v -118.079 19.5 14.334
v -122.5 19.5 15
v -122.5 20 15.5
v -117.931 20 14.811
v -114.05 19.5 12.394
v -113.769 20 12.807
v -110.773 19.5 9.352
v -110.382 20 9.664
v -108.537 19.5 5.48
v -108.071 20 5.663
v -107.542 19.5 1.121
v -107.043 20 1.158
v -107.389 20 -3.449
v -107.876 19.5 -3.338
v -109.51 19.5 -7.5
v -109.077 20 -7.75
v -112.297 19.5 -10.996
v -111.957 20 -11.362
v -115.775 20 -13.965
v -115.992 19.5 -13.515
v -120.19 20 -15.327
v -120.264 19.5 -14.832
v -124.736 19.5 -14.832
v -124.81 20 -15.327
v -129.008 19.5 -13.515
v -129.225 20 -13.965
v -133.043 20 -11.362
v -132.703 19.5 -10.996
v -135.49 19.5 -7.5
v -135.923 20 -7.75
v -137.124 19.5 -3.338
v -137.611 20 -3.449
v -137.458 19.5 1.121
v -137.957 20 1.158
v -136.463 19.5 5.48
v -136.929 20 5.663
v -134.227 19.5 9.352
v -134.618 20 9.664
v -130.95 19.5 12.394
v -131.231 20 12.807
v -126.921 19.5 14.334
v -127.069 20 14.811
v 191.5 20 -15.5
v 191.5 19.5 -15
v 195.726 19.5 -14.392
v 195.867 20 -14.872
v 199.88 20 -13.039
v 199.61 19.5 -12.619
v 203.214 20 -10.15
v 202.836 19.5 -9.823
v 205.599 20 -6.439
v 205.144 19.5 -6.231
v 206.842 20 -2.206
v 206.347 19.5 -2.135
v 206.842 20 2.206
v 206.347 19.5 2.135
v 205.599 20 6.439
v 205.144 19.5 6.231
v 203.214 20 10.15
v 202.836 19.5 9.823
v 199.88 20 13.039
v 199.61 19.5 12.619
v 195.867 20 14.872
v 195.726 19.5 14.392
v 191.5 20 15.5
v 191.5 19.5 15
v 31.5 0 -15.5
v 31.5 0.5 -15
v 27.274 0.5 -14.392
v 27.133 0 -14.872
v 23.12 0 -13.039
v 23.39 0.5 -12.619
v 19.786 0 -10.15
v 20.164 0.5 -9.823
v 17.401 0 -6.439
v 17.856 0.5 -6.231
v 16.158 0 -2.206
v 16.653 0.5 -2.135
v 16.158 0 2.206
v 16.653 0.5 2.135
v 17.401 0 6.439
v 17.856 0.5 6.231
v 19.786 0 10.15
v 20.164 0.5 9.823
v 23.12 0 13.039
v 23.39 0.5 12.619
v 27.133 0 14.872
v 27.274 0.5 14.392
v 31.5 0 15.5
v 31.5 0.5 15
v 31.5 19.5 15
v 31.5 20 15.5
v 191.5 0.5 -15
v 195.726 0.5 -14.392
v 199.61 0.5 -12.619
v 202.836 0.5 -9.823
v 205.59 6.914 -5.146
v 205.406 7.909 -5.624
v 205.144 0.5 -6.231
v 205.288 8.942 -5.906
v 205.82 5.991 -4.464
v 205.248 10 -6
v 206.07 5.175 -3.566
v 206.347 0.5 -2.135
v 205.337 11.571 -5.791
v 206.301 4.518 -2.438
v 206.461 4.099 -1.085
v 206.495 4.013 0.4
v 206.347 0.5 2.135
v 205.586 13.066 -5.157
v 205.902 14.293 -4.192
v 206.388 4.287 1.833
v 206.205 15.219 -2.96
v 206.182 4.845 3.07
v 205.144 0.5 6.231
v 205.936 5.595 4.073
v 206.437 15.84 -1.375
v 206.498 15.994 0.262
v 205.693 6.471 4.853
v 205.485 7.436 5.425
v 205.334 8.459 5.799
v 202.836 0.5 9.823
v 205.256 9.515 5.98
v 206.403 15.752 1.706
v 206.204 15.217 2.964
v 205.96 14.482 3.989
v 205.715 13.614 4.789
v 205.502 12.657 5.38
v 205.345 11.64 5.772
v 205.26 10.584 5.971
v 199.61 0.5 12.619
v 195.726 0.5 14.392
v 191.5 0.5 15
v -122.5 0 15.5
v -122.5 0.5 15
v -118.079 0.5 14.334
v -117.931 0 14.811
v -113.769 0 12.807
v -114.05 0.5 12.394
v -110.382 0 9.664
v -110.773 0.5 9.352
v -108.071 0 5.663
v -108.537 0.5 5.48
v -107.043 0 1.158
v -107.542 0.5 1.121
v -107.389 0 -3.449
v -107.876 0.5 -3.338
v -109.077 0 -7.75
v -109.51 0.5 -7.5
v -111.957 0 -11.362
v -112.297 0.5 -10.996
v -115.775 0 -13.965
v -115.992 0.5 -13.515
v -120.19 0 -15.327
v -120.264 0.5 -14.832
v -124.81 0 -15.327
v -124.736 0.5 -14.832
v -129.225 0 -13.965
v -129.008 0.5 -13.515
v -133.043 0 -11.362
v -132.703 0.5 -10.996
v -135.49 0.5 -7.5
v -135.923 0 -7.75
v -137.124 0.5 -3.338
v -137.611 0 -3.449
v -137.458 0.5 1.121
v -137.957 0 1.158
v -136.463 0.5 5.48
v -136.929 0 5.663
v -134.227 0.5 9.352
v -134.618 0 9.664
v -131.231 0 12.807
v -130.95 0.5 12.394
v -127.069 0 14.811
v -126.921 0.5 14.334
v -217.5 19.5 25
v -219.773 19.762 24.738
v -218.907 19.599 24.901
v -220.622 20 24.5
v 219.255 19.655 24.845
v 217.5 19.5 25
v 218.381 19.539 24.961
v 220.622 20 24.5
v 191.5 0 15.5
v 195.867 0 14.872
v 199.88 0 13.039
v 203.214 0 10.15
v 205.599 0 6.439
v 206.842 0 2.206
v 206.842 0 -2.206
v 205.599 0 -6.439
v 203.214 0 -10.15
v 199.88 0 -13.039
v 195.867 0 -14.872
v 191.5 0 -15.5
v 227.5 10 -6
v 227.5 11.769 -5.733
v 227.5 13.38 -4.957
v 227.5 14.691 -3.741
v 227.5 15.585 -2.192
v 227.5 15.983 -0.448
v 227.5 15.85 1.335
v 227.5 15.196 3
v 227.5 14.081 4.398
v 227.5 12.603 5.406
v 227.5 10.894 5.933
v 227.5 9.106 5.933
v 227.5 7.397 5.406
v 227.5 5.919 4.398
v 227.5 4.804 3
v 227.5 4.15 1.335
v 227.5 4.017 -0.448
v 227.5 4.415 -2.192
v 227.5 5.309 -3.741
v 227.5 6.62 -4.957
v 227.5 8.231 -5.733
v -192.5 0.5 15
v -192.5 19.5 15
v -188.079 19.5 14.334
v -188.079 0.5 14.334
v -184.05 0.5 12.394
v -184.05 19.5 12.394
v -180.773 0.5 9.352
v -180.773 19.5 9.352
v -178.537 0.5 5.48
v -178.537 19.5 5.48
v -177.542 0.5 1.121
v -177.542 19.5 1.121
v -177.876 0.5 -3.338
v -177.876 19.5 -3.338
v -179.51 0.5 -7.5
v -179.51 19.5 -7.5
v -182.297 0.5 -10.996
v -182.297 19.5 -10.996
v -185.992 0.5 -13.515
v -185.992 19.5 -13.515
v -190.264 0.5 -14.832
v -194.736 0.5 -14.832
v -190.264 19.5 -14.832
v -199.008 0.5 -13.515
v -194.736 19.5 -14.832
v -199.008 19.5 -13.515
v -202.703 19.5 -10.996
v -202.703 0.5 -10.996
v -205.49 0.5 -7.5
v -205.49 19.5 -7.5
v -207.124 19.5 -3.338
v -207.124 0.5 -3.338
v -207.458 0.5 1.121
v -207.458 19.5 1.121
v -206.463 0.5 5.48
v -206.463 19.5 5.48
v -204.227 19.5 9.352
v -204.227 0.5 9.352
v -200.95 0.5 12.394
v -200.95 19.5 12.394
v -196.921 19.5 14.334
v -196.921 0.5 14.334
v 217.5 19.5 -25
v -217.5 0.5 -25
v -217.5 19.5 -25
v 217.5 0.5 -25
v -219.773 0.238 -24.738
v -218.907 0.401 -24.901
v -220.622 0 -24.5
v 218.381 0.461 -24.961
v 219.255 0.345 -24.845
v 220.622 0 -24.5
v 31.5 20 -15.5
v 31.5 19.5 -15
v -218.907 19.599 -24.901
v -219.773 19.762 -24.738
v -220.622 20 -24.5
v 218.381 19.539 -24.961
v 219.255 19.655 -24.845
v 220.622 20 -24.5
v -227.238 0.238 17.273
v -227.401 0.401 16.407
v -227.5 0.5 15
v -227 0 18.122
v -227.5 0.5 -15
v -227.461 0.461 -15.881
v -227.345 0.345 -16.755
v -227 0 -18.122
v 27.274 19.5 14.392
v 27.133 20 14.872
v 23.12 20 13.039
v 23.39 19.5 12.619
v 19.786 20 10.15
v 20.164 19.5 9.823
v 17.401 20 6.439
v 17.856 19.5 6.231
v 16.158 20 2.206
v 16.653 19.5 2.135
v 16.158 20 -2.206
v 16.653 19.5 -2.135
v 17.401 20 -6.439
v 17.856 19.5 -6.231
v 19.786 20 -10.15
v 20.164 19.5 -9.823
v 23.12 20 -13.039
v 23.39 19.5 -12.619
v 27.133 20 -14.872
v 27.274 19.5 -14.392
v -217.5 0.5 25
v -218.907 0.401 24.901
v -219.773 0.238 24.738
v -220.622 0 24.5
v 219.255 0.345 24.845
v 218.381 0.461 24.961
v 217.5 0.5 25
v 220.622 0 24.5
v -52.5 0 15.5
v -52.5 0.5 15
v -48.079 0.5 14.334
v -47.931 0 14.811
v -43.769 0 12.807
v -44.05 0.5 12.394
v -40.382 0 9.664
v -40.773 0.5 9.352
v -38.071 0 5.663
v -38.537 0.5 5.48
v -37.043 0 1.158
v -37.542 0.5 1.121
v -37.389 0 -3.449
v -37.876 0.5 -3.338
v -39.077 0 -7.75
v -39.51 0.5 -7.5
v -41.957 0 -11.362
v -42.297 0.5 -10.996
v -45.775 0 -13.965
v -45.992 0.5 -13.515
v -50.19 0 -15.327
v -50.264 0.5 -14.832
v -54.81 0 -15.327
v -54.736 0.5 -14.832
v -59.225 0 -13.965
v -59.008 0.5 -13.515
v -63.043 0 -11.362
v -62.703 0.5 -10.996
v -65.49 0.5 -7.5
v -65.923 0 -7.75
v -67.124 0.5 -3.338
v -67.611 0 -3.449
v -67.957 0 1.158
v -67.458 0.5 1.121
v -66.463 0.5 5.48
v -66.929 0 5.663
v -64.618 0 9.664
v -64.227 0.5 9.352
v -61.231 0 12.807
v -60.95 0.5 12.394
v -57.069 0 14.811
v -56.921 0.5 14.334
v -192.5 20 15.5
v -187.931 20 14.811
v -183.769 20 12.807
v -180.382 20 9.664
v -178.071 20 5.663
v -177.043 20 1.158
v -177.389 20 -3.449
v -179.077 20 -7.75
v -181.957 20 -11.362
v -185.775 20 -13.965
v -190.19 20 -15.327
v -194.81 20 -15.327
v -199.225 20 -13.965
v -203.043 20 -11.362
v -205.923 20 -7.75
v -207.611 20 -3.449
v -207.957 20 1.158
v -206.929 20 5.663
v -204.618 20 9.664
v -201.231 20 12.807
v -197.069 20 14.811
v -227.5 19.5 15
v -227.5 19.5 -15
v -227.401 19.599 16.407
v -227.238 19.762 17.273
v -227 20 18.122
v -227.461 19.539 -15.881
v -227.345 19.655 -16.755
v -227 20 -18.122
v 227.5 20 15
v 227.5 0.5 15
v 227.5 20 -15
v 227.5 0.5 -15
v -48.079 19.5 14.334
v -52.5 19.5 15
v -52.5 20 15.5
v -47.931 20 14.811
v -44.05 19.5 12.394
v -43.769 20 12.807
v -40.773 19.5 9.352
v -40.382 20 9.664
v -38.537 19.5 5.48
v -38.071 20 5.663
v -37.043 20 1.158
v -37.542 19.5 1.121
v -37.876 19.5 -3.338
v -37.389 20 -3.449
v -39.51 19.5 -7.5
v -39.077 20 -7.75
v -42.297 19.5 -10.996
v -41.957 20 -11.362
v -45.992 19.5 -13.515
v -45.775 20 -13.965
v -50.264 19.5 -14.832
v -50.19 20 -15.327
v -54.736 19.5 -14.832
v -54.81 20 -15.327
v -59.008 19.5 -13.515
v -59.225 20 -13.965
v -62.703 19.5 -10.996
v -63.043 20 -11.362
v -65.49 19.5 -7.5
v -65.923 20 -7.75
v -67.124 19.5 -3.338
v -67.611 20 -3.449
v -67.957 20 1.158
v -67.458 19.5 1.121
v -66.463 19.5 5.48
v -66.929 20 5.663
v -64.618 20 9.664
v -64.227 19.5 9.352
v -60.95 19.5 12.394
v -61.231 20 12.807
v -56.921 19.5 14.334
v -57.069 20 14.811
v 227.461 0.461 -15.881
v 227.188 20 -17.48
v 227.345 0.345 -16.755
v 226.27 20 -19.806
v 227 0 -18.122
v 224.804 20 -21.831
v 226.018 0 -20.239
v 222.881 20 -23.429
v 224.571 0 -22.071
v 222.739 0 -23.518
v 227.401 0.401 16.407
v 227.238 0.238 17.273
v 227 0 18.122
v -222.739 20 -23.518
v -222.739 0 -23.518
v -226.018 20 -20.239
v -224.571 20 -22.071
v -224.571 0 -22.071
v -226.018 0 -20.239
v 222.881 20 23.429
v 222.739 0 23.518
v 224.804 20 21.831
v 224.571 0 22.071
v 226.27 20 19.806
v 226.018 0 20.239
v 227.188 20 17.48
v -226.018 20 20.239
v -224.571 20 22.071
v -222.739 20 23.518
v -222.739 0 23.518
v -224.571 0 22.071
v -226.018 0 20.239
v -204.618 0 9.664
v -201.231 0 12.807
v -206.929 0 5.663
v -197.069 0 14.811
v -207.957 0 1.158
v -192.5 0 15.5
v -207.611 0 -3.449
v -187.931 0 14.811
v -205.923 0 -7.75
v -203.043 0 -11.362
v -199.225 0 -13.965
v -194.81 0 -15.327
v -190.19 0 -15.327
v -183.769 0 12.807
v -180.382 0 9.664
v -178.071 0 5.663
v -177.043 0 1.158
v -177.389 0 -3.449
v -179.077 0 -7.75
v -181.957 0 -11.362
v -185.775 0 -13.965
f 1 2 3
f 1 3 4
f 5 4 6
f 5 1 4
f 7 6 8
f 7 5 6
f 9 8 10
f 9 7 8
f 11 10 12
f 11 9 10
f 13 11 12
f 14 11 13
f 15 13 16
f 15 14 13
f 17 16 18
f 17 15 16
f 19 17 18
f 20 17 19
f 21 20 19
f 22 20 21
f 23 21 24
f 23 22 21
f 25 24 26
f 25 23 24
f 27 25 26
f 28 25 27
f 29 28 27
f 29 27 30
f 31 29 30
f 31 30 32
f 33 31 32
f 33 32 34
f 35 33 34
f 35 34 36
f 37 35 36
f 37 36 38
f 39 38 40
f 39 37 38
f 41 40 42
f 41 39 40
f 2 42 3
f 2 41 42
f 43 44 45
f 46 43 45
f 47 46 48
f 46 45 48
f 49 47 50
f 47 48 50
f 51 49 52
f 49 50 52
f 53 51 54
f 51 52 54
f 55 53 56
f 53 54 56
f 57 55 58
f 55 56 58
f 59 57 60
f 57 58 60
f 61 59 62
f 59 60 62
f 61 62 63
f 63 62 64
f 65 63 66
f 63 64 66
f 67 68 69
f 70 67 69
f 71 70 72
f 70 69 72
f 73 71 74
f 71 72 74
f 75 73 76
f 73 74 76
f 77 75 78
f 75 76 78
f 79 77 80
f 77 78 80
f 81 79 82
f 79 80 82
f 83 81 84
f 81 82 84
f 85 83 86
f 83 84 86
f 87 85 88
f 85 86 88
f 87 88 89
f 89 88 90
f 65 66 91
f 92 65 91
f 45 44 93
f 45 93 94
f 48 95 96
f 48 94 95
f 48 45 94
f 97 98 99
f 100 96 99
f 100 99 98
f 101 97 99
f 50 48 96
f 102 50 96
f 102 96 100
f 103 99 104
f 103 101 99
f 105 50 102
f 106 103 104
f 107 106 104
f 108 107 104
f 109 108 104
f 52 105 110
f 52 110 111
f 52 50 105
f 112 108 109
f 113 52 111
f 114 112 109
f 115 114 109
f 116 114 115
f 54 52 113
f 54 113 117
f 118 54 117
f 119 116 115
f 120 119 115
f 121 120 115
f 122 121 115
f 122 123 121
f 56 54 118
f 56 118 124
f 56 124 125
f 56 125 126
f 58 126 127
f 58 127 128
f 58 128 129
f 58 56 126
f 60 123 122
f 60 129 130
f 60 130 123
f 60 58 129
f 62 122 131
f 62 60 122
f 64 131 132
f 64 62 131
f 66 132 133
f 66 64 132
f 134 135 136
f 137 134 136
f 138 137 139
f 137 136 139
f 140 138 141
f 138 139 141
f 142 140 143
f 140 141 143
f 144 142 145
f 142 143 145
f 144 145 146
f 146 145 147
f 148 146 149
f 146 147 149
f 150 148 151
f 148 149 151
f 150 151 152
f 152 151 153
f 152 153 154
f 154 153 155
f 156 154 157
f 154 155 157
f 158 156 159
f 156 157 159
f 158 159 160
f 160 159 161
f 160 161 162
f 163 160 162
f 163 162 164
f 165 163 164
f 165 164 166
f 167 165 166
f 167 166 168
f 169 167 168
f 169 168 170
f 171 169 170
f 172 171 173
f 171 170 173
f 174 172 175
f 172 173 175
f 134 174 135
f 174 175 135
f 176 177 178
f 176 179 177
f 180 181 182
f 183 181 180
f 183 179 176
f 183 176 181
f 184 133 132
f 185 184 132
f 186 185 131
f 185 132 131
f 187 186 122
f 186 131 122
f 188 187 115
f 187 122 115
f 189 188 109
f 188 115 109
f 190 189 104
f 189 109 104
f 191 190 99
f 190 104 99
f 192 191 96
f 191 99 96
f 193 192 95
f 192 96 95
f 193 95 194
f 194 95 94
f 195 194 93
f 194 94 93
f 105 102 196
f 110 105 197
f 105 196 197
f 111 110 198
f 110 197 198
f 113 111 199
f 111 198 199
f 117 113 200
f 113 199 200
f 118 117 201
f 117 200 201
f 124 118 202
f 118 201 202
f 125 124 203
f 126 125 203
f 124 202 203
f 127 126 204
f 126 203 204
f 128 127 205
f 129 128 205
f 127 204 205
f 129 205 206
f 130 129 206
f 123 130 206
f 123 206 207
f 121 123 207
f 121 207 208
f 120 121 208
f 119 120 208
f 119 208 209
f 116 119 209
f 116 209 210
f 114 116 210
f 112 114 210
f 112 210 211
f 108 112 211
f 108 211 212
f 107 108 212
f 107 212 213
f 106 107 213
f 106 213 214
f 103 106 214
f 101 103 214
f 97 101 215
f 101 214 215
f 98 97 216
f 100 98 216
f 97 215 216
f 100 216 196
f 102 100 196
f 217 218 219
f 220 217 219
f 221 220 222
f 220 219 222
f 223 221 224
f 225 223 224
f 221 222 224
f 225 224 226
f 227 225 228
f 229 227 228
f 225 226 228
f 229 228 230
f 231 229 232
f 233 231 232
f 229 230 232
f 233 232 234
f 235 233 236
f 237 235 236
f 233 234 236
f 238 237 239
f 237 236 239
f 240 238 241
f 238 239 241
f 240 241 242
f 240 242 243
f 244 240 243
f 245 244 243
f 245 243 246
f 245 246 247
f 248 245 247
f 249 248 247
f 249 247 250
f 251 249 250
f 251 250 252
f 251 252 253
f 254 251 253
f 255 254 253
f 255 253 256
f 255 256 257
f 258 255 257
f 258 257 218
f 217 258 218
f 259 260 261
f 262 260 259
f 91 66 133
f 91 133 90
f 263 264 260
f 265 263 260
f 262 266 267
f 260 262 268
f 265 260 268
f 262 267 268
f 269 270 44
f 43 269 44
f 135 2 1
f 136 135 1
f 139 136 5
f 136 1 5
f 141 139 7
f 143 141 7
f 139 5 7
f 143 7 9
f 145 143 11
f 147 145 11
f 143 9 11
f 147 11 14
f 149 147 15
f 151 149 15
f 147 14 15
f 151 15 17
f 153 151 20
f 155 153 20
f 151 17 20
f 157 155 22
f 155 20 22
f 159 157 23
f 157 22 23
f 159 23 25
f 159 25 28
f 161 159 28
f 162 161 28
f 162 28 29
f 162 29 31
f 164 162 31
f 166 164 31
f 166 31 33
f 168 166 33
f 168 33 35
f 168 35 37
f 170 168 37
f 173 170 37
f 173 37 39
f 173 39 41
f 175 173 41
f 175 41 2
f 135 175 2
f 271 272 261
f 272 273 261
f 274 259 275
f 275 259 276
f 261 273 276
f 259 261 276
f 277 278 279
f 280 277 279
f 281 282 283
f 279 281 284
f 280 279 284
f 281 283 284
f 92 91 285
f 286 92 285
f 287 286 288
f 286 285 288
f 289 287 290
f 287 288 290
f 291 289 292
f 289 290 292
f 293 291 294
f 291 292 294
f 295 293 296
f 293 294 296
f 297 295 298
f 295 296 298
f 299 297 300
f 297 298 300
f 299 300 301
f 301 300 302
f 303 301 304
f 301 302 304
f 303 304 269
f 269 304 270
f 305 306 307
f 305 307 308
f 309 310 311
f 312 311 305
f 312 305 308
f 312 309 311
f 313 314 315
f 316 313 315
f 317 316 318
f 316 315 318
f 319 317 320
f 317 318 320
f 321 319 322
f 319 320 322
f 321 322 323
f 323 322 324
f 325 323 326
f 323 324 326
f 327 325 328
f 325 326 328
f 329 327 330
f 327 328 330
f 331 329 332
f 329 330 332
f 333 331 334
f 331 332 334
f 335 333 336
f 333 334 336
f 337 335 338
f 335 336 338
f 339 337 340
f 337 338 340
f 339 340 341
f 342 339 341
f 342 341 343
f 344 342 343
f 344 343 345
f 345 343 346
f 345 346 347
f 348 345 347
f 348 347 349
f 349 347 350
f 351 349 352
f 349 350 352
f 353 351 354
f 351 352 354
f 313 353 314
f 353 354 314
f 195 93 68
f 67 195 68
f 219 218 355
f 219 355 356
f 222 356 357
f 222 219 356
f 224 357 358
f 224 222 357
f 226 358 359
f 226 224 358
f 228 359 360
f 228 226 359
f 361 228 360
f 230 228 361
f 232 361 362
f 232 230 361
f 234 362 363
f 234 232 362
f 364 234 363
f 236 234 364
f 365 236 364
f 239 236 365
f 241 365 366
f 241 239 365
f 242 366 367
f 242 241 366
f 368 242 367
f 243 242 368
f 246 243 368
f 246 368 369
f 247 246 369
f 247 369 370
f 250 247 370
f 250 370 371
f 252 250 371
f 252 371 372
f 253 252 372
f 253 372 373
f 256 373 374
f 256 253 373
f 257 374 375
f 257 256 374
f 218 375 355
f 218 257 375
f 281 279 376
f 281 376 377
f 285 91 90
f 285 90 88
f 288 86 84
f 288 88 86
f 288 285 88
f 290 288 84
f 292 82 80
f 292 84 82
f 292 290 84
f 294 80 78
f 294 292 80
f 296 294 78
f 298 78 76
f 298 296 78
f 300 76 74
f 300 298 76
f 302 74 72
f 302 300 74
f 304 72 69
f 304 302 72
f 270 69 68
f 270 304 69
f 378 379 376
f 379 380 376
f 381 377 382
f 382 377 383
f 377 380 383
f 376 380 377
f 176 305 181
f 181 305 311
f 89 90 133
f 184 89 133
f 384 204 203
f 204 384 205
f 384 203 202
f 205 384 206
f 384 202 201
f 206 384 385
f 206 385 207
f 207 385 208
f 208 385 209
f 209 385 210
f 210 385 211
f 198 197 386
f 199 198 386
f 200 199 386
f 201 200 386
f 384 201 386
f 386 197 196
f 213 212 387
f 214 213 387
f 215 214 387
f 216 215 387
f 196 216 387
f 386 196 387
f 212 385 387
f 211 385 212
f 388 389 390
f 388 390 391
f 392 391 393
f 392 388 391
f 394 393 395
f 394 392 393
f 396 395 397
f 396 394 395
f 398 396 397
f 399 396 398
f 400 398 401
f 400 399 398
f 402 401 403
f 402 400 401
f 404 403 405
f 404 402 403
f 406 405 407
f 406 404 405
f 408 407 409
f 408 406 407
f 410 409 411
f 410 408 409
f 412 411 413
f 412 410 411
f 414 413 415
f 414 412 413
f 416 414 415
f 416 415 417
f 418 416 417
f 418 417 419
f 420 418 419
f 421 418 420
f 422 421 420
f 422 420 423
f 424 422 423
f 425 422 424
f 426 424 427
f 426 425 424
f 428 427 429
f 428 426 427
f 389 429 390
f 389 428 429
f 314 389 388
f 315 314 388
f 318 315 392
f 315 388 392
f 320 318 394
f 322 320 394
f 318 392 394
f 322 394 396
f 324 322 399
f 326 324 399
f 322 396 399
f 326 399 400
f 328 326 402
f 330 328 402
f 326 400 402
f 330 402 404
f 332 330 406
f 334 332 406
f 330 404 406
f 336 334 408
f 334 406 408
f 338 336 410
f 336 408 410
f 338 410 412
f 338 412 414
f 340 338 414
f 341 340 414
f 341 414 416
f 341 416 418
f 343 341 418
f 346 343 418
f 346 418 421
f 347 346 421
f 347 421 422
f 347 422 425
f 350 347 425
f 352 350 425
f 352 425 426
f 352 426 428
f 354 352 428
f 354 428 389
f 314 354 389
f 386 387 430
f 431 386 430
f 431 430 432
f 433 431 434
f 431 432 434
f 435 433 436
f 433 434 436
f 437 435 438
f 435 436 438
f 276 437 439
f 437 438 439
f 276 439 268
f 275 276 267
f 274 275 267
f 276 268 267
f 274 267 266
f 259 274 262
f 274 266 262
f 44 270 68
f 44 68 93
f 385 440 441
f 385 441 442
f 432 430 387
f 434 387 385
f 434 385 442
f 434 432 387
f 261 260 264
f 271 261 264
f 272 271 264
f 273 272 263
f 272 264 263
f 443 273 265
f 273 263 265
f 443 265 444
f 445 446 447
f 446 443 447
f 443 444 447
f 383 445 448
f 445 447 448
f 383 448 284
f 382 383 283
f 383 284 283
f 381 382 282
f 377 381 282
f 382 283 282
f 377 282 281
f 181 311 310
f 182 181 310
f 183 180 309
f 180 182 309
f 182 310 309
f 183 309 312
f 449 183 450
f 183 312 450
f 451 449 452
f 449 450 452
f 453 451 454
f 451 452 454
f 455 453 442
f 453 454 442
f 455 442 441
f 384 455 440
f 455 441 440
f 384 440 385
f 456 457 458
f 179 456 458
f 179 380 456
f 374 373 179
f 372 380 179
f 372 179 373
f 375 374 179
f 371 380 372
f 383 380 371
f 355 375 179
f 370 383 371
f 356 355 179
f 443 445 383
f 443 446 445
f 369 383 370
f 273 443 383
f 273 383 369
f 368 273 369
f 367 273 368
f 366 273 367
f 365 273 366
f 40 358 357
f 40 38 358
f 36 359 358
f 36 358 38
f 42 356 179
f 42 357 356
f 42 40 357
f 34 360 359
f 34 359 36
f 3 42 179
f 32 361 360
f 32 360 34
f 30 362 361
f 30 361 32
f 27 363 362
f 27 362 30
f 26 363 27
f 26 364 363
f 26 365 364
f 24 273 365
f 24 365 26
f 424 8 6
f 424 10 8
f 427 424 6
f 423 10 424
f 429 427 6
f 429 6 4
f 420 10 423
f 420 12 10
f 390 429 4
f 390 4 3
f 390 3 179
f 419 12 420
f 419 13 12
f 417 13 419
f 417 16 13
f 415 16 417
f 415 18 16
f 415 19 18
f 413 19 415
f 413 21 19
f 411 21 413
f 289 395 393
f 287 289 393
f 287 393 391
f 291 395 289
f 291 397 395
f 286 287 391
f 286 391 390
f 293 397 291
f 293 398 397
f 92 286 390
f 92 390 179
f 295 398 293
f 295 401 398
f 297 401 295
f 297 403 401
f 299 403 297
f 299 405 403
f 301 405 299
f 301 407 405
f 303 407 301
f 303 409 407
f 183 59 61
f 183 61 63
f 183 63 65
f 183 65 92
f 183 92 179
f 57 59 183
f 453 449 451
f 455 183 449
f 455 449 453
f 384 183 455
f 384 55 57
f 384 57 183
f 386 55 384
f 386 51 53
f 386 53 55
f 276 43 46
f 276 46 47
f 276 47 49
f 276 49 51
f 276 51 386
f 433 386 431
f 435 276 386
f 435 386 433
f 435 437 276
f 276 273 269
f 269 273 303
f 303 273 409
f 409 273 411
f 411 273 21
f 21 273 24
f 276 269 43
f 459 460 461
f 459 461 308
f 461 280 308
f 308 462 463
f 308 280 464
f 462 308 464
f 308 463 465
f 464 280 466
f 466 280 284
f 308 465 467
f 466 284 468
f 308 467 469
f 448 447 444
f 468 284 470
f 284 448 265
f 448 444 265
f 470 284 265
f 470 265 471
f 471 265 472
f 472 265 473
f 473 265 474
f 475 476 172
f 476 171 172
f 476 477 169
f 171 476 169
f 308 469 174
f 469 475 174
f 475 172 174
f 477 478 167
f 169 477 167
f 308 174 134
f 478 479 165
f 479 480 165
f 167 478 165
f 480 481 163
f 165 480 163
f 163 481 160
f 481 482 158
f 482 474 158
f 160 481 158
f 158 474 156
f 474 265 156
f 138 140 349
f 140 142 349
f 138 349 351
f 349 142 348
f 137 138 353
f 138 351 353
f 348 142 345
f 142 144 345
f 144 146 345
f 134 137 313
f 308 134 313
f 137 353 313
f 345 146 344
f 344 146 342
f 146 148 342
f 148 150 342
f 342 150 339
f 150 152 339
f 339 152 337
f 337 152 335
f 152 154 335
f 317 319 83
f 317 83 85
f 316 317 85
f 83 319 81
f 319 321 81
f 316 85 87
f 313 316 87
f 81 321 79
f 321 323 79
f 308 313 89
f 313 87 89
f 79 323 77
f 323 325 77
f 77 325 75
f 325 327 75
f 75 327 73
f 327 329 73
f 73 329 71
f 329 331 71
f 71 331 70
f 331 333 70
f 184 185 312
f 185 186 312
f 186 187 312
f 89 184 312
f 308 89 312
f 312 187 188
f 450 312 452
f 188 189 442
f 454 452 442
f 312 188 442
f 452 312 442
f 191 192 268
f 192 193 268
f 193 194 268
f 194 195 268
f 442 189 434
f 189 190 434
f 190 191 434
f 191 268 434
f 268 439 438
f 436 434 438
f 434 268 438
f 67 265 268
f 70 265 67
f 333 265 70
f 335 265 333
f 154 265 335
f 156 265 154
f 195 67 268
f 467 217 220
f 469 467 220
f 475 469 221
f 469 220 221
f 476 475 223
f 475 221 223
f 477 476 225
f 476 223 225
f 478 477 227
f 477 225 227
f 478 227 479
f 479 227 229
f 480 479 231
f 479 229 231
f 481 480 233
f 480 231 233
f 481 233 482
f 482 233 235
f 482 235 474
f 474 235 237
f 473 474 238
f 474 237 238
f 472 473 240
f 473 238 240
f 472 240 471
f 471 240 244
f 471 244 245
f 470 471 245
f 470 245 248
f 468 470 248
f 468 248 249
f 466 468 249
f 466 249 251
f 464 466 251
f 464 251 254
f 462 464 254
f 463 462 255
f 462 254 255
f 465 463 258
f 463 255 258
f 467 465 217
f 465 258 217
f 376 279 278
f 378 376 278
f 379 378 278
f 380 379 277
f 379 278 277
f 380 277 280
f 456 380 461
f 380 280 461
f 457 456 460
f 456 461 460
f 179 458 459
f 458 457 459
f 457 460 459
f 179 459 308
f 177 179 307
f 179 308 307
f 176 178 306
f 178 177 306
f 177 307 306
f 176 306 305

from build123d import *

# Parameters (mm, degrees)
SKETCH_1_W               = 455
SKETCH_1_H               = 50
EXTRUDE_1_DEPTH          = 20
SKETCH_2_R               = 15
CUT_EXTRUDE_1_DEPTH      = 230.741702788
CUT_EXTRUDE_2_REACH      = 458.125
CUT_EXTRUDE_2_END_RADIUS = 15
SKETCH_3_R               = 6
CHAMFER_1_SIZE           = 0.5
CHAMFER_2_SIZE           = 0.5
FILLET_1_R               = 10


with BuildPart() as part:
    # 草图1 → 凸台-拉伸1 (new body)
    with BuildSketch(Plane(origin=(0, 0, 0), x_dir=(1, 0, 0), z_dir=(0, 1, 0))):
        Rectangle(SKETCH_1_W, SKETCH_1_H)
    extrude(amount=EXTRUDE_1_DEPTH)

    # 草图2 → 切除-拉伸1 (cut, through all)
    with BuildSketch(Plane(origin=(0, 20, 0), x_dir=(1, 0, 0), z_dir=(0, 1, 0))):
        with Locations(Location((-192.5, 0, 0), (0, 0, 270))):
            Circle(SKETCH_2_R)
        with Locations(Location((-122.5, 0, 0), (0, 0, 270))):
            Circle(SKETCH_2_R)
        with Locations(Location((-52.5, 0, 0), (0, 0, 270))):
            Circle(SKETCH_2_R)
        with BuildLine():
            Line((31.5, 15), (191.5, 15))
            ThreePointArc((191.5, 15), (206.5, 0), (191.5, -15))
            Line((191.5, -15), (31.5, -15))
            ThreePointArc((31.5, -15), (16.5, 0), (31.5, 15))
        make_face()
    extrude(amount=-CUT_EXTRUDE_1_DEPTH, mode=Mode.SUBTRACT)

    # 切除-拉伸2: up to this cylinder (the profile starts outside it)
    cut_extrude_2_end = Plane(origin=(191.5, 10, 0), z_dir=(0, 1, 0)) * Cylinder(CUT_EXTRUDE_2_END_RADIUS, 947.25, mode=Mode.PRIVATE)
    # 草图3 → 切除-拉伸2 (cut, up to the surface)
    with BuildSketch(Plane(origin=(227.5, 0, 0), x_dir=(0, 0, -1), z_dir=(1, 0, 0)), mode=Mode.PRIVATE) as cut_extrude_2_sk1:
        with Locations((0, 10)):
            Circle(SKETCH_3_R)
    cut_extrude_2_tool1 = extrude(cut_extrude_2_sk1.sketch, amount=-CUT_EXTRUDE_2_REACH, mode=Mode.PRIVATE) - cut_extrude_2_end
    add(cut_extrude_2_tool1.solids().sort_by_distance((227.5, 10, 0))[0], mode=Mode.SUBTRACT)

    # 倒角1
    chamfer_1_edges = [part.edges().sort_by_distance(p)[0] for p in [
        (-192.5, 0, -15),
        (-192.5, 20, -15),
        (-122.5, 0, -15),
        (-122.5, 20, -15),
        (-52.5, 0, -15),
        (-52.5, 20, -15),
        (16.5, 0, 0),
        (111.5, 0, -15),
        (206.5, 0, 0),
        (111.5, 0, 15),
        (16.5, 20, 0),
        (111.5, 20, 15),
        (206.5, 20, 0),
        (111.5, 20, -15),
    ]]
    chamfer(chamfer_1_edges, length=CHAMFER_1_SIZE)

    # 倒角2
    chamfer_2_edges = [part.edges().sort_by_distance(p)[0] for p in [
        (0, 20, -25),
        (-227.5, 20, 0),
        (0, 0, -25),
        (227.5, 0, 0),
        (0, 0, 25),
        (-227.5, 0, 0),
        (0, 20, 25),
    ]]
    chamfer(chamfer_2_edges, length=CHAMFER_2_SIZE)

    # 圆角1
    # the kernel refuses this fillet: 10 mm, written as the material it takes off along each edge
    with BuildSketch(Plane(origin=(227.5, -24.5, 25), x_dir=(0, 0, -1), z_dir=(0, 1, 0)), Plane(origin=(227.5, -24.5, -25), x_dir=(-1, 0, 0), z_dir=(0, 1, 0))) as fillet_1_piece_1:
        with BuildLine():
            CenterArc((FILLET_1_R, FILLET_1_R), FILLET_1_R, 180, 90)
            Line((0, FILLET_1_R), (0, 0))
            Line((0, 0), (FILLET_1_R, 0))
        make_face()
    extrude(amount=69, mode=Mode.SUBTRACT)
    with BuildSketch(Plane(origin=(-227.5, -24.5, -25), x_dir=(1, 0, 0), z_dir=(0, 1, 0)), Plane(origin=(-227.5, -24.5, 25), x_dir=(0, 0, -1), z_dir=(0, 1, 0))) as fillet_1_piece_2:
        with BuildLine():
            CenterArc((FILLET_1_R, -FILLET_1_R), FILLET_1_R, 90, 90)
            Line((0, -FILLET_1_R), (0, 0))
            Line((0, 0), (FILLET_1_R, 0))
        make_face()
    extrude(amount=69, mode=Mode.SUBTRACT)


solid = part.part
